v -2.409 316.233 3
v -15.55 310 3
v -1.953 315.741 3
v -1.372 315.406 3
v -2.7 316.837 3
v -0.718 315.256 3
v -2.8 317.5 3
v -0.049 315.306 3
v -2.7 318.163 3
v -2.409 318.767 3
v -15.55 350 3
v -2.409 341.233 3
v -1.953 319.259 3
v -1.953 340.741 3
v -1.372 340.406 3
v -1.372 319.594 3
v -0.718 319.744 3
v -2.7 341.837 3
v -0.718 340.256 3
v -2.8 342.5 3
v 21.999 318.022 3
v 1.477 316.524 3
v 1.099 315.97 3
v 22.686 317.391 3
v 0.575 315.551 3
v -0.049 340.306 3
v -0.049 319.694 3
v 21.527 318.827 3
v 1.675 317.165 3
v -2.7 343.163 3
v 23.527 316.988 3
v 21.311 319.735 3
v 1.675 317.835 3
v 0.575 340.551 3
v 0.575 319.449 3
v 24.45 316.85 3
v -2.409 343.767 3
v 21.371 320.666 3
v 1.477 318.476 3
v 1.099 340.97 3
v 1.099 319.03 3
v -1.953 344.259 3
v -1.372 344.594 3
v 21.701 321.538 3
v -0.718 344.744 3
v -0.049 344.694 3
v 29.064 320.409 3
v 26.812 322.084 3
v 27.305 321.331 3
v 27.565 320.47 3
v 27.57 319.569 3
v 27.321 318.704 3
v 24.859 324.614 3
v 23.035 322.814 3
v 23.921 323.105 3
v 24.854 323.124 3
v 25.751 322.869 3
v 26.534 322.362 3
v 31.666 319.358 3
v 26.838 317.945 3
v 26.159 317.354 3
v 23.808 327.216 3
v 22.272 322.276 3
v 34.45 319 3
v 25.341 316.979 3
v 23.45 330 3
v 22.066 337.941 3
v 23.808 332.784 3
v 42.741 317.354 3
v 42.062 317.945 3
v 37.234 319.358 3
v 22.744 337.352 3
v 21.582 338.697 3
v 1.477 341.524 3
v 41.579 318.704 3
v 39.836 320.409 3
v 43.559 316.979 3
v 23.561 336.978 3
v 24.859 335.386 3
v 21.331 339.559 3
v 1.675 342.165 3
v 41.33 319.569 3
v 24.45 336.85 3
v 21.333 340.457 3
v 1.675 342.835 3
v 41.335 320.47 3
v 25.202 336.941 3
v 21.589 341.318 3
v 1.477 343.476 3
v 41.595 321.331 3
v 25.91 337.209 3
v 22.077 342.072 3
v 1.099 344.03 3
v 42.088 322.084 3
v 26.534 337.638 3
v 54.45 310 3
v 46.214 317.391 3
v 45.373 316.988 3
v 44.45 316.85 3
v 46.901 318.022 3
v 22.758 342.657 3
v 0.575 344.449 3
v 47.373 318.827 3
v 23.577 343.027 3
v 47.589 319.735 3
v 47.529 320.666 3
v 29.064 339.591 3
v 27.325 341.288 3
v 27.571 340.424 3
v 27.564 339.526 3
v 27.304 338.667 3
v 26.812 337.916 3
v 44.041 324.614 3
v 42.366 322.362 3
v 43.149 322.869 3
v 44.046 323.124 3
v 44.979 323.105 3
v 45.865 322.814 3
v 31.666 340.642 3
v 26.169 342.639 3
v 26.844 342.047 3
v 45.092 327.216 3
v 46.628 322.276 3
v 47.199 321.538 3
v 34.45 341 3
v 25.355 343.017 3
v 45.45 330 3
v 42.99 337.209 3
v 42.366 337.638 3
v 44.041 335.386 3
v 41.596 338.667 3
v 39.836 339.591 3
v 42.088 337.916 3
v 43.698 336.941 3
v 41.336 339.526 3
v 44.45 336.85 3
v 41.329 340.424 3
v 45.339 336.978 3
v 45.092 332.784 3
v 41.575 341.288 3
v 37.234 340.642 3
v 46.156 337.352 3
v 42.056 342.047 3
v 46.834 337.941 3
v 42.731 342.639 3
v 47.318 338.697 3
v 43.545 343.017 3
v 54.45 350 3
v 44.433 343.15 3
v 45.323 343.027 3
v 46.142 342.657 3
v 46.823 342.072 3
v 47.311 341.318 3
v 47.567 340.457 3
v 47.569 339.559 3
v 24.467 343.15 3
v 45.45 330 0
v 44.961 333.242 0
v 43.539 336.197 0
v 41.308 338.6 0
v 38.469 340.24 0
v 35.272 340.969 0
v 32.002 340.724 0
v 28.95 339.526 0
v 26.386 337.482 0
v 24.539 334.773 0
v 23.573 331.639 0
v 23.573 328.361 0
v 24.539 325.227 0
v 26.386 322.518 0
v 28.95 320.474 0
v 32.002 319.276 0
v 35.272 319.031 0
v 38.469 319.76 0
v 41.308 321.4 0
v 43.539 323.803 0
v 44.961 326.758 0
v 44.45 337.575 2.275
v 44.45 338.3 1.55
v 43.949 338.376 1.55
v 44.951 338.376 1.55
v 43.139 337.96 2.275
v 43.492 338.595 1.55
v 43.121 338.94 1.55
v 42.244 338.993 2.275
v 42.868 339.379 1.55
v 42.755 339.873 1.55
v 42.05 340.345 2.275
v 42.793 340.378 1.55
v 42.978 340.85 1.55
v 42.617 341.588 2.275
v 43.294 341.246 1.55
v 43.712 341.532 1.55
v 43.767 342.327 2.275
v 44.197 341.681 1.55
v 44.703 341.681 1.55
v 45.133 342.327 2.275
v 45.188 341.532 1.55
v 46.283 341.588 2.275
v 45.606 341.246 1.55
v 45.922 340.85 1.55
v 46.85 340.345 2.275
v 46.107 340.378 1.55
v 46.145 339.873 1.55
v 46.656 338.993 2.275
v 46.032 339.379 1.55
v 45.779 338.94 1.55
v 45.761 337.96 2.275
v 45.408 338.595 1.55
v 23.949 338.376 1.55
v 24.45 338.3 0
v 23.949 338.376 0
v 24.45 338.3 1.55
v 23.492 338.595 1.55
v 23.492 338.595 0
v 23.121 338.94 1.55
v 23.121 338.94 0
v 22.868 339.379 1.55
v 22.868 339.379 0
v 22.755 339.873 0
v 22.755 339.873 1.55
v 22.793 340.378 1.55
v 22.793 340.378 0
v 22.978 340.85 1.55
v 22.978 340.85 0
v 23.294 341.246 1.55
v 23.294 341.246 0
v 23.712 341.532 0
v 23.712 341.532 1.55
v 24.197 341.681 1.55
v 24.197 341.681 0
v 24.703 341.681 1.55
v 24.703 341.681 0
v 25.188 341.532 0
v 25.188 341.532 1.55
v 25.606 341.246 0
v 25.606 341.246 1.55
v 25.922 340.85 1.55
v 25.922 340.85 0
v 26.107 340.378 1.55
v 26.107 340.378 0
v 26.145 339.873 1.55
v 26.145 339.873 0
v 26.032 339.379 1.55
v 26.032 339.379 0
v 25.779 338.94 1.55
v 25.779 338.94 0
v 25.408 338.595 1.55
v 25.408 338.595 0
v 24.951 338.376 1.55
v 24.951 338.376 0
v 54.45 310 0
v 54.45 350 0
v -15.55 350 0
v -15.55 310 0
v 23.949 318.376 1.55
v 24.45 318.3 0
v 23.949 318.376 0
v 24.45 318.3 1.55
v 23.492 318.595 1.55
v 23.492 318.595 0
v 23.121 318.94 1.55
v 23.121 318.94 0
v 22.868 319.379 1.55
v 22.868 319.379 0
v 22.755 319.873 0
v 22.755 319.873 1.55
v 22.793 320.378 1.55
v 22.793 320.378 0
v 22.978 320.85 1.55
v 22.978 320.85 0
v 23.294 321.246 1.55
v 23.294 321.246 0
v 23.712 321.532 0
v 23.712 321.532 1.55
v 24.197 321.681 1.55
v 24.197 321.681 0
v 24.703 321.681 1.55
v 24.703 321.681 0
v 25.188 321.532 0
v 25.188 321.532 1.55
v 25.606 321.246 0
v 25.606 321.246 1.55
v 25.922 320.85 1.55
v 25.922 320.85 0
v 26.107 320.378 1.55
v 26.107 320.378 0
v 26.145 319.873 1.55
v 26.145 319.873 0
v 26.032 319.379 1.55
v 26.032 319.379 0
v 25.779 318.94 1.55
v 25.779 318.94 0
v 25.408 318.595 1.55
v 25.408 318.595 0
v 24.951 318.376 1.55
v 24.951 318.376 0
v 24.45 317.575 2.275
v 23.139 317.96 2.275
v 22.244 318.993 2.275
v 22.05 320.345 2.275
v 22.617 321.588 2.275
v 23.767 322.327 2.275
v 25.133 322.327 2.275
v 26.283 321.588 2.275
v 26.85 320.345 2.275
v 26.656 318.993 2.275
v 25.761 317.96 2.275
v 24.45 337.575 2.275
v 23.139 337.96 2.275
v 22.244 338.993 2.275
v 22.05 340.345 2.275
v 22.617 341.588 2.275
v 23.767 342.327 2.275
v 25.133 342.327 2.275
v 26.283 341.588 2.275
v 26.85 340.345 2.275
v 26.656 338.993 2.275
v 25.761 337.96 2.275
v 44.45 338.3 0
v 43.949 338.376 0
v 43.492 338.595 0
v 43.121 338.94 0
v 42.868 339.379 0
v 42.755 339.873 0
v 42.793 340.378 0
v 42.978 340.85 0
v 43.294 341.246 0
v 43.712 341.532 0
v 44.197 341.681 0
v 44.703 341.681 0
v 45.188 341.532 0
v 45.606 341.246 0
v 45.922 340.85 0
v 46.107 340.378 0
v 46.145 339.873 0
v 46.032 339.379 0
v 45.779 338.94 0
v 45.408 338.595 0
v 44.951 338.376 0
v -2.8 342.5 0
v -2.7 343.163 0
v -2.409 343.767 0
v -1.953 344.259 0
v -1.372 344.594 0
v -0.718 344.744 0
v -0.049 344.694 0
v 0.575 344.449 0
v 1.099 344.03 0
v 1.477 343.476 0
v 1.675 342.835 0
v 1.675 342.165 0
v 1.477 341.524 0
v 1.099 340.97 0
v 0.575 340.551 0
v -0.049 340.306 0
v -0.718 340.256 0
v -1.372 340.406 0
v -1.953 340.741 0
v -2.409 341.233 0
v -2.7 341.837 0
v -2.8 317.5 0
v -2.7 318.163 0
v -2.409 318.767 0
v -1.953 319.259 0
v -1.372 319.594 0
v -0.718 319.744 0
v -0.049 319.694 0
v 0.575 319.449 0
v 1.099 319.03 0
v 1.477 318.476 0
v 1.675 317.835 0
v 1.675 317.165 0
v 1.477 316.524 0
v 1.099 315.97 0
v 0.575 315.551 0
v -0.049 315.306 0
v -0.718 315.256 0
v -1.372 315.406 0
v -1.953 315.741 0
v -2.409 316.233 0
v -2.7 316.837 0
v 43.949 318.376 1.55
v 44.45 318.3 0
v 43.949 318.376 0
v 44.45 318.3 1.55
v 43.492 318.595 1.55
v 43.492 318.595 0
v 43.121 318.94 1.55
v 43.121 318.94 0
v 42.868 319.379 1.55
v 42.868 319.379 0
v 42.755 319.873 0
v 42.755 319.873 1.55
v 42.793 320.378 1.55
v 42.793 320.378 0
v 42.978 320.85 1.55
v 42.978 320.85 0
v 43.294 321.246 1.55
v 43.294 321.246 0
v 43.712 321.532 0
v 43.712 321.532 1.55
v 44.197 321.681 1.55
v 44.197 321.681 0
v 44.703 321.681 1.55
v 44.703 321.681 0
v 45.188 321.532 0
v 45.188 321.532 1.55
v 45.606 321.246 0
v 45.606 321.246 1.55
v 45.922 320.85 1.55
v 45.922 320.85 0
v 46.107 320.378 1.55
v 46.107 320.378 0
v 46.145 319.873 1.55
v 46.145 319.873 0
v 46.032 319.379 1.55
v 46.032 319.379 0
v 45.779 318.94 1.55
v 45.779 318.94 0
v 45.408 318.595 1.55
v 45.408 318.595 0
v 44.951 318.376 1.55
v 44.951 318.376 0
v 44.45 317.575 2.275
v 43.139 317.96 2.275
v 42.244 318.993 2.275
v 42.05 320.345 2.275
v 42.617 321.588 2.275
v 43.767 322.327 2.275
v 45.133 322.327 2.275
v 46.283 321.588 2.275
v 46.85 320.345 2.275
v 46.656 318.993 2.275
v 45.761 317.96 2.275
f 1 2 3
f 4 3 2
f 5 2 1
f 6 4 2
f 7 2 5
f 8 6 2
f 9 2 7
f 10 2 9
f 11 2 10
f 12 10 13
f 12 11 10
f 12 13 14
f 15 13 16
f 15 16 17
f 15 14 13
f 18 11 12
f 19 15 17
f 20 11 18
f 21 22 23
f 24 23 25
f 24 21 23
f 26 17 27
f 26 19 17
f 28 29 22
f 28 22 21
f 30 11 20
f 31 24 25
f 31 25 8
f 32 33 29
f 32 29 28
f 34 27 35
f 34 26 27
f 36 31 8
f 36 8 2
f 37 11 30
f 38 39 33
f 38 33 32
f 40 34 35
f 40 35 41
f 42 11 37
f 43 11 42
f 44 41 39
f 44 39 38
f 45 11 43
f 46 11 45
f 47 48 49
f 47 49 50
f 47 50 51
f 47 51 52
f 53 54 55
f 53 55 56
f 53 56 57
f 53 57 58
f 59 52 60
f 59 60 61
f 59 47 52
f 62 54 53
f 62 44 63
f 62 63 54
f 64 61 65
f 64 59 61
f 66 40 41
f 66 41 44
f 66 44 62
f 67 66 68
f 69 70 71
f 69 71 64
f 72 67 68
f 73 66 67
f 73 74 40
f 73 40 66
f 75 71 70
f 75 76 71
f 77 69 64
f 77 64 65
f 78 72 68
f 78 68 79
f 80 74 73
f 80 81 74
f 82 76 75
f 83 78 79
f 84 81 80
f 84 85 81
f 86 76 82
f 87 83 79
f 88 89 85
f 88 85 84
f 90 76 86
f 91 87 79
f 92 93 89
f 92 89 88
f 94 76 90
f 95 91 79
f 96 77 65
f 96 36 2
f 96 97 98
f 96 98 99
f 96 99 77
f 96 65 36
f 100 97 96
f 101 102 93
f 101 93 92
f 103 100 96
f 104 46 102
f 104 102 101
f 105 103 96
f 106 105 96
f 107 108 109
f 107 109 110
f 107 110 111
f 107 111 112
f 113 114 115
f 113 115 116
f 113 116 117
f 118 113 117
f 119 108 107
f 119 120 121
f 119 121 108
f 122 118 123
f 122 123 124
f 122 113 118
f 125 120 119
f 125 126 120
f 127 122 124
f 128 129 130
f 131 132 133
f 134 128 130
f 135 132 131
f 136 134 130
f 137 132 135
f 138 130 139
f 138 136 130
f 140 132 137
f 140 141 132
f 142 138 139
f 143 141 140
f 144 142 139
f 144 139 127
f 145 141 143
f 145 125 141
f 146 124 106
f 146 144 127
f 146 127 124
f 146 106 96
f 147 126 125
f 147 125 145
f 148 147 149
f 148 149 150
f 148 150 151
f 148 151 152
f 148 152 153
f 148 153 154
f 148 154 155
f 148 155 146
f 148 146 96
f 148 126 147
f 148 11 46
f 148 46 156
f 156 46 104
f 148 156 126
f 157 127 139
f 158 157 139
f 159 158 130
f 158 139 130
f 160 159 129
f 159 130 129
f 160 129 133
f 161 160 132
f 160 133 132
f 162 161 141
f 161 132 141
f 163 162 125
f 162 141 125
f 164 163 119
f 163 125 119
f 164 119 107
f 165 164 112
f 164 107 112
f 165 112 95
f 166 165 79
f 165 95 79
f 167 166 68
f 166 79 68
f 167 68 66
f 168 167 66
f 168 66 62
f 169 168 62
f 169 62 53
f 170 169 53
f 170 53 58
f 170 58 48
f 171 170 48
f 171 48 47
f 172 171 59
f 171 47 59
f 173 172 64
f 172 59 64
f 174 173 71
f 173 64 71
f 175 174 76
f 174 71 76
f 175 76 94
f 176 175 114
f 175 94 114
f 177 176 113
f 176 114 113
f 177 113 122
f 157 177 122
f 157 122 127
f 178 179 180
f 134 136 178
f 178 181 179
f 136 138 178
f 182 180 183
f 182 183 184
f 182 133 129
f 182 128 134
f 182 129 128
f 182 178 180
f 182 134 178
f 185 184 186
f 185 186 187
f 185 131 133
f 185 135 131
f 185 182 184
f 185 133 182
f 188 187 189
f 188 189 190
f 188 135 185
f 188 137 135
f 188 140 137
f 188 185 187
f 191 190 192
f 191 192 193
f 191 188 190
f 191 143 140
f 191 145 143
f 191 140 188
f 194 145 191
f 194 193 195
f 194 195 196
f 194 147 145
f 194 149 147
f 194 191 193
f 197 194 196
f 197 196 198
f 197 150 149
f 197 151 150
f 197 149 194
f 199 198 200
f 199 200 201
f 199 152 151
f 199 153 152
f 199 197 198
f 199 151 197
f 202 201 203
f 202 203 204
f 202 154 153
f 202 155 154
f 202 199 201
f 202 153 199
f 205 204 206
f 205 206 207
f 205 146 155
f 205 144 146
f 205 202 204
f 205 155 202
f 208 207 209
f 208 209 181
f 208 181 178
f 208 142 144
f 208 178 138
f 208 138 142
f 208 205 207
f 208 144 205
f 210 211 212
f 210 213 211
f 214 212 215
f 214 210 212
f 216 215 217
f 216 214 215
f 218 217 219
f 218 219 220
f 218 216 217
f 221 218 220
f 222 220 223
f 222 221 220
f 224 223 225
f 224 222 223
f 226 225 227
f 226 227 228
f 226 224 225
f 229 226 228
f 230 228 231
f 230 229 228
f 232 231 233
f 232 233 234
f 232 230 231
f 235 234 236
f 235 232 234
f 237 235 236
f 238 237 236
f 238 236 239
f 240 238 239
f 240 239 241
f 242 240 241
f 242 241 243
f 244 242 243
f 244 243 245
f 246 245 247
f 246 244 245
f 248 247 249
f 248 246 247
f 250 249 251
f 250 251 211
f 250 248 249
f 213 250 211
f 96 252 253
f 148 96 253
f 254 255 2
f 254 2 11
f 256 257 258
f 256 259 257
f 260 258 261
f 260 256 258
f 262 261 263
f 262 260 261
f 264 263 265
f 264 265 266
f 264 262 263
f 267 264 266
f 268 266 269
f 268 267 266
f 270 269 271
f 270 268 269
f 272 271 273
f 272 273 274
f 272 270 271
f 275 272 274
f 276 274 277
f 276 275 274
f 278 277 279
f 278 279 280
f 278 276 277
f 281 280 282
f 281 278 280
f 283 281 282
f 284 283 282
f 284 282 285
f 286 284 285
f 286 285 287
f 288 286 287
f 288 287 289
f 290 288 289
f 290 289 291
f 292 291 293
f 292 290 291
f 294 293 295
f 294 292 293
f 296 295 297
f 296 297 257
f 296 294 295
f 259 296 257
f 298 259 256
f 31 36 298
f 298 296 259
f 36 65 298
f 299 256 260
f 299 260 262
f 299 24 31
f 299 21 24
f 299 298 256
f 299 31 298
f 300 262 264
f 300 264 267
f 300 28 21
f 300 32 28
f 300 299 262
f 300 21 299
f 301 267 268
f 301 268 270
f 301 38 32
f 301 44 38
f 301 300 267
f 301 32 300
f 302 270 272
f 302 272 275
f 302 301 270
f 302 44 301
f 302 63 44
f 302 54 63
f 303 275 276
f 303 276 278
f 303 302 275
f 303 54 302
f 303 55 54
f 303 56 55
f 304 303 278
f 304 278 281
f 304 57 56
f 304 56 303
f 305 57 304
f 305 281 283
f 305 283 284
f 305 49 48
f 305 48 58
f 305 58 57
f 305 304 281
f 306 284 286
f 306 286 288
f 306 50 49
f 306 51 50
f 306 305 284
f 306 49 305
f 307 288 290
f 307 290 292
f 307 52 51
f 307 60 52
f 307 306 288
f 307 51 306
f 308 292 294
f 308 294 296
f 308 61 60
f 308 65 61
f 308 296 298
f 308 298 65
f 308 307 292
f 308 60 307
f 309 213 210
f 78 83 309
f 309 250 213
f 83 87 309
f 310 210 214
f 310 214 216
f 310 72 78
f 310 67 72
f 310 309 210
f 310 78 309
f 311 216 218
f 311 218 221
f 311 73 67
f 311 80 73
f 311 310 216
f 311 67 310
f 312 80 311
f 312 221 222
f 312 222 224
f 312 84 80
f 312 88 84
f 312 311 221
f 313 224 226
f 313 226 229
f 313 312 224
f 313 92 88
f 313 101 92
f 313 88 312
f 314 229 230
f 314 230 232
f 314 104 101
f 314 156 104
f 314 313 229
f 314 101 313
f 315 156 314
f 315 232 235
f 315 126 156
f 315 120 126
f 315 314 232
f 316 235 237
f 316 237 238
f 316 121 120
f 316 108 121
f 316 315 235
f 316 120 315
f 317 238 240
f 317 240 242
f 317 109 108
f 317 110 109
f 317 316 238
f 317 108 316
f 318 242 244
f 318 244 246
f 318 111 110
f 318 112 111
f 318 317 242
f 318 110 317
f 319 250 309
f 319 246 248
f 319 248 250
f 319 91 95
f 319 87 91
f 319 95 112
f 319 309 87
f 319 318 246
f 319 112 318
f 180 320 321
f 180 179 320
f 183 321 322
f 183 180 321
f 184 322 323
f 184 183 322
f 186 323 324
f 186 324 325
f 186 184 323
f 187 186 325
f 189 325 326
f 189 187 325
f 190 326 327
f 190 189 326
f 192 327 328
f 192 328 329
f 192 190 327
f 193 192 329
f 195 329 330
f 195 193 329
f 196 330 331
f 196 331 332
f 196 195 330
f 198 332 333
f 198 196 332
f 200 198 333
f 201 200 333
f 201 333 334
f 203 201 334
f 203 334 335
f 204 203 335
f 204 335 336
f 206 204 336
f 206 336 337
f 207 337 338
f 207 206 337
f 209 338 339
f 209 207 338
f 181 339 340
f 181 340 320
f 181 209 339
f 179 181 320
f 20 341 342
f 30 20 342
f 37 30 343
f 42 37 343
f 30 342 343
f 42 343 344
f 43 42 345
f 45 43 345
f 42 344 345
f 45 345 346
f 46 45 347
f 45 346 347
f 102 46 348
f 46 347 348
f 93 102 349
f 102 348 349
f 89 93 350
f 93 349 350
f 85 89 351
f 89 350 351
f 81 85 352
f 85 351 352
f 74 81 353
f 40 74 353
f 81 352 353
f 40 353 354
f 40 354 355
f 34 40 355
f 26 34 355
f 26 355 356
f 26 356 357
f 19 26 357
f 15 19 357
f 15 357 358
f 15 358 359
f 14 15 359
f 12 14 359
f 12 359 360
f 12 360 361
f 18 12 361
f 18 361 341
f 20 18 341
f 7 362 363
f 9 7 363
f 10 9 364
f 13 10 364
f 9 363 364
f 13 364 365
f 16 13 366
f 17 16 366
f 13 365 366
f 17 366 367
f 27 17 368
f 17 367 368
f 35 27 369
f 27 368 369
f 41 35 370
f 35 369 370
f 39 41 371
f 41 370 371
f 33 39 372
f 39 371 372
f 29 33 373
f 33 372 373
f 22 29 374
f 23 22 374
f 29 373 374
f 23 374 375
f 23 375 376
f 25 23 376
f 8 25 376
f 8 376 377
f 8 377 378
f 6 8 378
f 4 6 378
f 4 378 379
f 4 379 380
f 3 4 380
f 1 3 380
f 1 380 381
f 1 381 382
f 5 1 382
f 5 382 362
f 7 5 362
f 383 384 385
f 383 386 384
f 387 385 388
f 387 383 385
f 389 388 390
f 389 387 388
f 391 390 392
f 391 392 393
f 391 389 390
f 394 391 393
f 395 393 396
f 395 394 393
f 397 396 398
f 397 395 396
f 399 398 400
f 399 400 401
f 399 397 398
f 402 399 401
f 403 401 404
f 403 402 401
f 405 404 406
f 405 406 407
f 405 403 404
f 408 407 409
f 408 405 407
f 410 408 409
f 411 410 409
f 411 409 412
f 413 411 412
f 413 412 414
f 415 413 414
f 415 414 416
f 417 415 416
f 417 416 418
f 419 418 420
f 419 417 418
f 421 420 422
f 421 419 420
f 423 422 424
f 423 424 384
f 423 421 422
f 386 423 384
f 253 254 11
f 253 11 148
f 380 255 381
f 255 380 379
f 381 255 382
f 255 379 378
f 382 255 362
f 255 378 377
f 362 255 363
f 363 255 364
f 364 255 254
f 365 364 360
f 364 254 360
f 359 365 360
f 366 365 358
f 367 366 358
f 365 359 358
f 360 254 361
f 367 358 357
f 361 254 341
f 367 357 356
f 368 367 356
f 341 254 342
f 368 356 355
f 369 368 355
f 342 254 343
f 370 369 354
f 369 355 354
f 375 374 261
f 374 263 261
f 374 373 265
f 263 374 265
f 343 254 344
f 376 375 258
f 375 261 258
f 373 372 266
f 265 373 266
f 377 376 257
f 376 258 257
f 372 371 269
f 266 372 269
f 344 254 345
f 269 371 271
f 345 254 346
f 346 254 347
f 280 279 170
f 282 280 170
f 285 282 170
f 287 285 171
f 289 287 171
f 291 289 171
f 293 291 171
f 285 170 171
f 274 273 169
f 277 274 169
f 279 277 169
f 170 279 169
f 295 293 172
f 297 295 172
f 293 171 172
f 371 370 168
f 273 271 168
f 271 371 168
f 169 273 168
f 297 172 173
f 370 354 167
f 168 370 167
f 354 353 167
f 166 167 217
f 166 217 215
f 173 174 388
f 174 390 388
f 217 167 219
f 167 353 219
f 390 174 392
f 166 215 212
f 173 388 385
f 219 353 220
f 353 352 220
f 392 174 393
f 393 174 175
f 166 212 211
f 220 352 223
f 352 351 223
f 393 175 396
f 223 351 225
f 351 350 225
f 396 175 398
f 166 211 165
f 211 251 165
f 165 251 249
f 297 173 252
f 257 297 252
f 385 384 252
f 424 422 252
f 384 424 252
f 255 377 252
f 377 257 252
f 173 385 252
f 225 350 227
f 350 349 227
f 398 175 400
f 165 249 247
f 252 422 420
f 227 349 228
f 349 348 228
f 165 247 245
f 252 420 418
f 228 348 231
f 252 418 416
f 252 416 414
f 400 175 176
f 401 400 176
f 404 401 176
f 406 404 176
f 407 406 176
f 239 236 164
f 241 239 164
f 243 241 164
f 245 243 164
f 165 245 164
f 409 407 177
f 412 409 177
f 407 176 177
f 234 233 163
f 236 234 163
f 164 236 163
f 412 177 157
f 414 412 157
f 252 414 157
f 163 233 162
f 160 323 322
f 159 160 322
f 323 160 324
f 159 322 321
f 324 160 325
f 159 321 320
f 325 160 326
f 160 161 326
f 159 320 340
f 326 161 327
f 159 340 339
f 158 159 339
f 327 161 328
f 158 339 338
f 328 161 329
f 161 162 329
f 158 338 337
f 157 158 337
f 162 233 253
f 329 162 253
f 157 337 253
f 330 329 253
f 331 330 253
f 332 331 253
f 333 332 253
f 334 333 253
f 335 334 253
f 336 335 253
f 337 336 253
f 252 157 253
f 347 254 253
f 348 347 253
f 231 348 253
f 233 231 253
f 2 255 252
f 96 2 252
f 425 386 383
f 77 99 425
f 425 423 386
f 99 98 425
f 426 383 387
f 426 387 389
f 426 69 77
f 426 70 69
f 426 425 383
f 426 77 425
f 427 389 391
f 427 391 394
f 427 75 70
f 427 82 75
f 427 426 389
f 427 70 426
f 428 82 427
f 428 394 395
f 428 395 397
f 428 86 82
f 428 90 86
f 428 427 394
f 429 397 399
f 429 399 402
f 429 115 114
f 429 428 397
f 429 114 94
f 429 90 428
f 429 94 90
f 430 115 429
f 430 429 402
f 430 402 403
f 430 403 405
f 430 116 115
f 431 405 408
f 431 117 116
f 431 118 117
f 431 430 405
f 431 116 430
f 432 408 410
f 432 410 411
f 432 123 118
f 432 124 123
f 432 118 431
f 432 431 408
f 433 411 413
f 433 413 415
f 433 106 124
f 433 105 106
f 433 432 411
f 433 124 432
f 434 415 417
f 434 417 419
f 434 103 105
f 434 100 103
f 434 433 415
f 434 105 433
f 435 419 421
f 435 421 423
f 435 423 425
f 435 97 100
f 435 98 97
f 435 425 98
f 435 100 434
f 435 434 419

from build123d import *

# Parameters (mm, degrees)
SKIZZE1_W                                    = 70
SKIZZE1_H                                    = 40
AUFSATZ_LINEAR_AUSTRAGEN1_DEPTH              = 3
FORMSENKUNG_F_R_M3_LINSENSENKSCHRAUB_2_COUNT = 2
FORMSENKUNG_F_R_M3_LINSENSENKSCHRAUB_2_PITCH = 20
FORMSENKUNG_F_R_M3_LINSENSENKSCHRAUB_3_COUNT = 2
FORMSENKUNG_F_R_M3_LINSENSENKSCHRAUB_3_PITCH = 28.284271247
FORMSENKUNG_F_R_M3_LINSENSENKSCHRAUB_4_COUNT = 2
FORMSENKUNG_F_R_M3_LINSENSENKSCHRAUB_4_PITCH = 20
DURCHGANGSLOCH_F_R_M41_D                     = 4.5
F_22_0_22_DURCHMESSER_BOHRUNG1_D             = 22


with BuildPart() as part:
    # Skizze1 → Aufsatz-Linear austragen1 (new body)
    with BuildSketch(Plane.XY):
        with Locations((19.450005134, 330)):
            Rectangle(SKIZZE1_W, SKIZZE1_H)
    extrude(amount=AUFSATZ_LINEAR_AUSTRAGEN1_DEPTH)

    # Skizze3 → Formsenkung für M3 Linsensenkschraube mit Schlitz6 (revolve, cut)
    with BuildSketch(Plane(origin=(24.450005134, 340, 3), x_dir=(0, -1, 0), z_dir=(1, 0, 0))):
        Polygon((0, 0), (0, 3), (1.7, 3), (1.7, 1.45), (3.15, 0), align=None)
    formsenkung_f_r_m3_linsensenkschraube_mi = revolve(axis=Axis((24.450005134, 340, 9.35), (0, 0, -1)), mode=Mode.SUBTRACT)

    # Formsenkung f_r M3 Linsensenkschraub 2: Formsenkung für M3 Linsensenkschraube mit Schlitz6 ×2
    with Locations(*[(i * FORMSENKUNG_F_R_M3_LINSENSENKSCHRAUB_2_PITCH, 0, 0) for i in range(1, FORMSENKUNG_F_R_M3_LINSENSENKSCHRAUB_2_COUNT)]):
        add(formsenkung_f_r_m3_linsensenkschraube_mi, mode=Mode.SUBTRACT)

    # Formsenkung f_r M3 Linsensenkschraub 3: Formsenkung für M3 Linsensenkschraube mit Schlitz6 ×2
    with Locations(*[Vector(0.7071067811865485, -0.7071067811865466, 0) * (i * FORMSENKUNG_F_R_M3_LINSENSENKSCHRAUB_3_PITCH) for i in range(1, FORMSENKUNG_F_R_M3_LINSENSENKSCHRAUB_3_COUNT)]):
        add(formsenkung_f_r_m3_linsensenkschraube_mi, mode=Mode.SUBTRACT)

    # Formsenkung f_r M3 Linsensenkschraub 4: Formsenkung für M3 Linsensenkschraube mit Schlitz6 ×2
    with Locations(*[(0, -i * FORMSENKUNG_F_R_M3_LINSENSENKSCHRAUB_4_PITCH, 0) for i in range(1, FORMSENKUNG_F_R_M3_LINSENSENKSCHRAUB_4_COUNT)]):
        add(formsenkung_f_r_m3_linsensenkschraube_mi, mode=Mode.SUBTRACT)

    # Durchgangsloch für M41 (through all)
    with Locations(Plane.XY.offset(3)):
        with Locations((-0.549994866, 342.5), (-0.549994866, 317.5)):
            Hole(DURCHGANGSLOCH_F_R_M41_D / 2)

    # Ø22.0 (22) Durchmesser Bohrung1 (through all)
    with Locations(Plane(origin=(0, 0, 0), x_dir=(-1, 0, 0), z_dir=(0, 0, -1))):
        with Locations((-34.450005134, 330)):
            Hole(F_22_0_22_DURCHMESSER_BOHRUNG1_D / 2)


solid = part.part
